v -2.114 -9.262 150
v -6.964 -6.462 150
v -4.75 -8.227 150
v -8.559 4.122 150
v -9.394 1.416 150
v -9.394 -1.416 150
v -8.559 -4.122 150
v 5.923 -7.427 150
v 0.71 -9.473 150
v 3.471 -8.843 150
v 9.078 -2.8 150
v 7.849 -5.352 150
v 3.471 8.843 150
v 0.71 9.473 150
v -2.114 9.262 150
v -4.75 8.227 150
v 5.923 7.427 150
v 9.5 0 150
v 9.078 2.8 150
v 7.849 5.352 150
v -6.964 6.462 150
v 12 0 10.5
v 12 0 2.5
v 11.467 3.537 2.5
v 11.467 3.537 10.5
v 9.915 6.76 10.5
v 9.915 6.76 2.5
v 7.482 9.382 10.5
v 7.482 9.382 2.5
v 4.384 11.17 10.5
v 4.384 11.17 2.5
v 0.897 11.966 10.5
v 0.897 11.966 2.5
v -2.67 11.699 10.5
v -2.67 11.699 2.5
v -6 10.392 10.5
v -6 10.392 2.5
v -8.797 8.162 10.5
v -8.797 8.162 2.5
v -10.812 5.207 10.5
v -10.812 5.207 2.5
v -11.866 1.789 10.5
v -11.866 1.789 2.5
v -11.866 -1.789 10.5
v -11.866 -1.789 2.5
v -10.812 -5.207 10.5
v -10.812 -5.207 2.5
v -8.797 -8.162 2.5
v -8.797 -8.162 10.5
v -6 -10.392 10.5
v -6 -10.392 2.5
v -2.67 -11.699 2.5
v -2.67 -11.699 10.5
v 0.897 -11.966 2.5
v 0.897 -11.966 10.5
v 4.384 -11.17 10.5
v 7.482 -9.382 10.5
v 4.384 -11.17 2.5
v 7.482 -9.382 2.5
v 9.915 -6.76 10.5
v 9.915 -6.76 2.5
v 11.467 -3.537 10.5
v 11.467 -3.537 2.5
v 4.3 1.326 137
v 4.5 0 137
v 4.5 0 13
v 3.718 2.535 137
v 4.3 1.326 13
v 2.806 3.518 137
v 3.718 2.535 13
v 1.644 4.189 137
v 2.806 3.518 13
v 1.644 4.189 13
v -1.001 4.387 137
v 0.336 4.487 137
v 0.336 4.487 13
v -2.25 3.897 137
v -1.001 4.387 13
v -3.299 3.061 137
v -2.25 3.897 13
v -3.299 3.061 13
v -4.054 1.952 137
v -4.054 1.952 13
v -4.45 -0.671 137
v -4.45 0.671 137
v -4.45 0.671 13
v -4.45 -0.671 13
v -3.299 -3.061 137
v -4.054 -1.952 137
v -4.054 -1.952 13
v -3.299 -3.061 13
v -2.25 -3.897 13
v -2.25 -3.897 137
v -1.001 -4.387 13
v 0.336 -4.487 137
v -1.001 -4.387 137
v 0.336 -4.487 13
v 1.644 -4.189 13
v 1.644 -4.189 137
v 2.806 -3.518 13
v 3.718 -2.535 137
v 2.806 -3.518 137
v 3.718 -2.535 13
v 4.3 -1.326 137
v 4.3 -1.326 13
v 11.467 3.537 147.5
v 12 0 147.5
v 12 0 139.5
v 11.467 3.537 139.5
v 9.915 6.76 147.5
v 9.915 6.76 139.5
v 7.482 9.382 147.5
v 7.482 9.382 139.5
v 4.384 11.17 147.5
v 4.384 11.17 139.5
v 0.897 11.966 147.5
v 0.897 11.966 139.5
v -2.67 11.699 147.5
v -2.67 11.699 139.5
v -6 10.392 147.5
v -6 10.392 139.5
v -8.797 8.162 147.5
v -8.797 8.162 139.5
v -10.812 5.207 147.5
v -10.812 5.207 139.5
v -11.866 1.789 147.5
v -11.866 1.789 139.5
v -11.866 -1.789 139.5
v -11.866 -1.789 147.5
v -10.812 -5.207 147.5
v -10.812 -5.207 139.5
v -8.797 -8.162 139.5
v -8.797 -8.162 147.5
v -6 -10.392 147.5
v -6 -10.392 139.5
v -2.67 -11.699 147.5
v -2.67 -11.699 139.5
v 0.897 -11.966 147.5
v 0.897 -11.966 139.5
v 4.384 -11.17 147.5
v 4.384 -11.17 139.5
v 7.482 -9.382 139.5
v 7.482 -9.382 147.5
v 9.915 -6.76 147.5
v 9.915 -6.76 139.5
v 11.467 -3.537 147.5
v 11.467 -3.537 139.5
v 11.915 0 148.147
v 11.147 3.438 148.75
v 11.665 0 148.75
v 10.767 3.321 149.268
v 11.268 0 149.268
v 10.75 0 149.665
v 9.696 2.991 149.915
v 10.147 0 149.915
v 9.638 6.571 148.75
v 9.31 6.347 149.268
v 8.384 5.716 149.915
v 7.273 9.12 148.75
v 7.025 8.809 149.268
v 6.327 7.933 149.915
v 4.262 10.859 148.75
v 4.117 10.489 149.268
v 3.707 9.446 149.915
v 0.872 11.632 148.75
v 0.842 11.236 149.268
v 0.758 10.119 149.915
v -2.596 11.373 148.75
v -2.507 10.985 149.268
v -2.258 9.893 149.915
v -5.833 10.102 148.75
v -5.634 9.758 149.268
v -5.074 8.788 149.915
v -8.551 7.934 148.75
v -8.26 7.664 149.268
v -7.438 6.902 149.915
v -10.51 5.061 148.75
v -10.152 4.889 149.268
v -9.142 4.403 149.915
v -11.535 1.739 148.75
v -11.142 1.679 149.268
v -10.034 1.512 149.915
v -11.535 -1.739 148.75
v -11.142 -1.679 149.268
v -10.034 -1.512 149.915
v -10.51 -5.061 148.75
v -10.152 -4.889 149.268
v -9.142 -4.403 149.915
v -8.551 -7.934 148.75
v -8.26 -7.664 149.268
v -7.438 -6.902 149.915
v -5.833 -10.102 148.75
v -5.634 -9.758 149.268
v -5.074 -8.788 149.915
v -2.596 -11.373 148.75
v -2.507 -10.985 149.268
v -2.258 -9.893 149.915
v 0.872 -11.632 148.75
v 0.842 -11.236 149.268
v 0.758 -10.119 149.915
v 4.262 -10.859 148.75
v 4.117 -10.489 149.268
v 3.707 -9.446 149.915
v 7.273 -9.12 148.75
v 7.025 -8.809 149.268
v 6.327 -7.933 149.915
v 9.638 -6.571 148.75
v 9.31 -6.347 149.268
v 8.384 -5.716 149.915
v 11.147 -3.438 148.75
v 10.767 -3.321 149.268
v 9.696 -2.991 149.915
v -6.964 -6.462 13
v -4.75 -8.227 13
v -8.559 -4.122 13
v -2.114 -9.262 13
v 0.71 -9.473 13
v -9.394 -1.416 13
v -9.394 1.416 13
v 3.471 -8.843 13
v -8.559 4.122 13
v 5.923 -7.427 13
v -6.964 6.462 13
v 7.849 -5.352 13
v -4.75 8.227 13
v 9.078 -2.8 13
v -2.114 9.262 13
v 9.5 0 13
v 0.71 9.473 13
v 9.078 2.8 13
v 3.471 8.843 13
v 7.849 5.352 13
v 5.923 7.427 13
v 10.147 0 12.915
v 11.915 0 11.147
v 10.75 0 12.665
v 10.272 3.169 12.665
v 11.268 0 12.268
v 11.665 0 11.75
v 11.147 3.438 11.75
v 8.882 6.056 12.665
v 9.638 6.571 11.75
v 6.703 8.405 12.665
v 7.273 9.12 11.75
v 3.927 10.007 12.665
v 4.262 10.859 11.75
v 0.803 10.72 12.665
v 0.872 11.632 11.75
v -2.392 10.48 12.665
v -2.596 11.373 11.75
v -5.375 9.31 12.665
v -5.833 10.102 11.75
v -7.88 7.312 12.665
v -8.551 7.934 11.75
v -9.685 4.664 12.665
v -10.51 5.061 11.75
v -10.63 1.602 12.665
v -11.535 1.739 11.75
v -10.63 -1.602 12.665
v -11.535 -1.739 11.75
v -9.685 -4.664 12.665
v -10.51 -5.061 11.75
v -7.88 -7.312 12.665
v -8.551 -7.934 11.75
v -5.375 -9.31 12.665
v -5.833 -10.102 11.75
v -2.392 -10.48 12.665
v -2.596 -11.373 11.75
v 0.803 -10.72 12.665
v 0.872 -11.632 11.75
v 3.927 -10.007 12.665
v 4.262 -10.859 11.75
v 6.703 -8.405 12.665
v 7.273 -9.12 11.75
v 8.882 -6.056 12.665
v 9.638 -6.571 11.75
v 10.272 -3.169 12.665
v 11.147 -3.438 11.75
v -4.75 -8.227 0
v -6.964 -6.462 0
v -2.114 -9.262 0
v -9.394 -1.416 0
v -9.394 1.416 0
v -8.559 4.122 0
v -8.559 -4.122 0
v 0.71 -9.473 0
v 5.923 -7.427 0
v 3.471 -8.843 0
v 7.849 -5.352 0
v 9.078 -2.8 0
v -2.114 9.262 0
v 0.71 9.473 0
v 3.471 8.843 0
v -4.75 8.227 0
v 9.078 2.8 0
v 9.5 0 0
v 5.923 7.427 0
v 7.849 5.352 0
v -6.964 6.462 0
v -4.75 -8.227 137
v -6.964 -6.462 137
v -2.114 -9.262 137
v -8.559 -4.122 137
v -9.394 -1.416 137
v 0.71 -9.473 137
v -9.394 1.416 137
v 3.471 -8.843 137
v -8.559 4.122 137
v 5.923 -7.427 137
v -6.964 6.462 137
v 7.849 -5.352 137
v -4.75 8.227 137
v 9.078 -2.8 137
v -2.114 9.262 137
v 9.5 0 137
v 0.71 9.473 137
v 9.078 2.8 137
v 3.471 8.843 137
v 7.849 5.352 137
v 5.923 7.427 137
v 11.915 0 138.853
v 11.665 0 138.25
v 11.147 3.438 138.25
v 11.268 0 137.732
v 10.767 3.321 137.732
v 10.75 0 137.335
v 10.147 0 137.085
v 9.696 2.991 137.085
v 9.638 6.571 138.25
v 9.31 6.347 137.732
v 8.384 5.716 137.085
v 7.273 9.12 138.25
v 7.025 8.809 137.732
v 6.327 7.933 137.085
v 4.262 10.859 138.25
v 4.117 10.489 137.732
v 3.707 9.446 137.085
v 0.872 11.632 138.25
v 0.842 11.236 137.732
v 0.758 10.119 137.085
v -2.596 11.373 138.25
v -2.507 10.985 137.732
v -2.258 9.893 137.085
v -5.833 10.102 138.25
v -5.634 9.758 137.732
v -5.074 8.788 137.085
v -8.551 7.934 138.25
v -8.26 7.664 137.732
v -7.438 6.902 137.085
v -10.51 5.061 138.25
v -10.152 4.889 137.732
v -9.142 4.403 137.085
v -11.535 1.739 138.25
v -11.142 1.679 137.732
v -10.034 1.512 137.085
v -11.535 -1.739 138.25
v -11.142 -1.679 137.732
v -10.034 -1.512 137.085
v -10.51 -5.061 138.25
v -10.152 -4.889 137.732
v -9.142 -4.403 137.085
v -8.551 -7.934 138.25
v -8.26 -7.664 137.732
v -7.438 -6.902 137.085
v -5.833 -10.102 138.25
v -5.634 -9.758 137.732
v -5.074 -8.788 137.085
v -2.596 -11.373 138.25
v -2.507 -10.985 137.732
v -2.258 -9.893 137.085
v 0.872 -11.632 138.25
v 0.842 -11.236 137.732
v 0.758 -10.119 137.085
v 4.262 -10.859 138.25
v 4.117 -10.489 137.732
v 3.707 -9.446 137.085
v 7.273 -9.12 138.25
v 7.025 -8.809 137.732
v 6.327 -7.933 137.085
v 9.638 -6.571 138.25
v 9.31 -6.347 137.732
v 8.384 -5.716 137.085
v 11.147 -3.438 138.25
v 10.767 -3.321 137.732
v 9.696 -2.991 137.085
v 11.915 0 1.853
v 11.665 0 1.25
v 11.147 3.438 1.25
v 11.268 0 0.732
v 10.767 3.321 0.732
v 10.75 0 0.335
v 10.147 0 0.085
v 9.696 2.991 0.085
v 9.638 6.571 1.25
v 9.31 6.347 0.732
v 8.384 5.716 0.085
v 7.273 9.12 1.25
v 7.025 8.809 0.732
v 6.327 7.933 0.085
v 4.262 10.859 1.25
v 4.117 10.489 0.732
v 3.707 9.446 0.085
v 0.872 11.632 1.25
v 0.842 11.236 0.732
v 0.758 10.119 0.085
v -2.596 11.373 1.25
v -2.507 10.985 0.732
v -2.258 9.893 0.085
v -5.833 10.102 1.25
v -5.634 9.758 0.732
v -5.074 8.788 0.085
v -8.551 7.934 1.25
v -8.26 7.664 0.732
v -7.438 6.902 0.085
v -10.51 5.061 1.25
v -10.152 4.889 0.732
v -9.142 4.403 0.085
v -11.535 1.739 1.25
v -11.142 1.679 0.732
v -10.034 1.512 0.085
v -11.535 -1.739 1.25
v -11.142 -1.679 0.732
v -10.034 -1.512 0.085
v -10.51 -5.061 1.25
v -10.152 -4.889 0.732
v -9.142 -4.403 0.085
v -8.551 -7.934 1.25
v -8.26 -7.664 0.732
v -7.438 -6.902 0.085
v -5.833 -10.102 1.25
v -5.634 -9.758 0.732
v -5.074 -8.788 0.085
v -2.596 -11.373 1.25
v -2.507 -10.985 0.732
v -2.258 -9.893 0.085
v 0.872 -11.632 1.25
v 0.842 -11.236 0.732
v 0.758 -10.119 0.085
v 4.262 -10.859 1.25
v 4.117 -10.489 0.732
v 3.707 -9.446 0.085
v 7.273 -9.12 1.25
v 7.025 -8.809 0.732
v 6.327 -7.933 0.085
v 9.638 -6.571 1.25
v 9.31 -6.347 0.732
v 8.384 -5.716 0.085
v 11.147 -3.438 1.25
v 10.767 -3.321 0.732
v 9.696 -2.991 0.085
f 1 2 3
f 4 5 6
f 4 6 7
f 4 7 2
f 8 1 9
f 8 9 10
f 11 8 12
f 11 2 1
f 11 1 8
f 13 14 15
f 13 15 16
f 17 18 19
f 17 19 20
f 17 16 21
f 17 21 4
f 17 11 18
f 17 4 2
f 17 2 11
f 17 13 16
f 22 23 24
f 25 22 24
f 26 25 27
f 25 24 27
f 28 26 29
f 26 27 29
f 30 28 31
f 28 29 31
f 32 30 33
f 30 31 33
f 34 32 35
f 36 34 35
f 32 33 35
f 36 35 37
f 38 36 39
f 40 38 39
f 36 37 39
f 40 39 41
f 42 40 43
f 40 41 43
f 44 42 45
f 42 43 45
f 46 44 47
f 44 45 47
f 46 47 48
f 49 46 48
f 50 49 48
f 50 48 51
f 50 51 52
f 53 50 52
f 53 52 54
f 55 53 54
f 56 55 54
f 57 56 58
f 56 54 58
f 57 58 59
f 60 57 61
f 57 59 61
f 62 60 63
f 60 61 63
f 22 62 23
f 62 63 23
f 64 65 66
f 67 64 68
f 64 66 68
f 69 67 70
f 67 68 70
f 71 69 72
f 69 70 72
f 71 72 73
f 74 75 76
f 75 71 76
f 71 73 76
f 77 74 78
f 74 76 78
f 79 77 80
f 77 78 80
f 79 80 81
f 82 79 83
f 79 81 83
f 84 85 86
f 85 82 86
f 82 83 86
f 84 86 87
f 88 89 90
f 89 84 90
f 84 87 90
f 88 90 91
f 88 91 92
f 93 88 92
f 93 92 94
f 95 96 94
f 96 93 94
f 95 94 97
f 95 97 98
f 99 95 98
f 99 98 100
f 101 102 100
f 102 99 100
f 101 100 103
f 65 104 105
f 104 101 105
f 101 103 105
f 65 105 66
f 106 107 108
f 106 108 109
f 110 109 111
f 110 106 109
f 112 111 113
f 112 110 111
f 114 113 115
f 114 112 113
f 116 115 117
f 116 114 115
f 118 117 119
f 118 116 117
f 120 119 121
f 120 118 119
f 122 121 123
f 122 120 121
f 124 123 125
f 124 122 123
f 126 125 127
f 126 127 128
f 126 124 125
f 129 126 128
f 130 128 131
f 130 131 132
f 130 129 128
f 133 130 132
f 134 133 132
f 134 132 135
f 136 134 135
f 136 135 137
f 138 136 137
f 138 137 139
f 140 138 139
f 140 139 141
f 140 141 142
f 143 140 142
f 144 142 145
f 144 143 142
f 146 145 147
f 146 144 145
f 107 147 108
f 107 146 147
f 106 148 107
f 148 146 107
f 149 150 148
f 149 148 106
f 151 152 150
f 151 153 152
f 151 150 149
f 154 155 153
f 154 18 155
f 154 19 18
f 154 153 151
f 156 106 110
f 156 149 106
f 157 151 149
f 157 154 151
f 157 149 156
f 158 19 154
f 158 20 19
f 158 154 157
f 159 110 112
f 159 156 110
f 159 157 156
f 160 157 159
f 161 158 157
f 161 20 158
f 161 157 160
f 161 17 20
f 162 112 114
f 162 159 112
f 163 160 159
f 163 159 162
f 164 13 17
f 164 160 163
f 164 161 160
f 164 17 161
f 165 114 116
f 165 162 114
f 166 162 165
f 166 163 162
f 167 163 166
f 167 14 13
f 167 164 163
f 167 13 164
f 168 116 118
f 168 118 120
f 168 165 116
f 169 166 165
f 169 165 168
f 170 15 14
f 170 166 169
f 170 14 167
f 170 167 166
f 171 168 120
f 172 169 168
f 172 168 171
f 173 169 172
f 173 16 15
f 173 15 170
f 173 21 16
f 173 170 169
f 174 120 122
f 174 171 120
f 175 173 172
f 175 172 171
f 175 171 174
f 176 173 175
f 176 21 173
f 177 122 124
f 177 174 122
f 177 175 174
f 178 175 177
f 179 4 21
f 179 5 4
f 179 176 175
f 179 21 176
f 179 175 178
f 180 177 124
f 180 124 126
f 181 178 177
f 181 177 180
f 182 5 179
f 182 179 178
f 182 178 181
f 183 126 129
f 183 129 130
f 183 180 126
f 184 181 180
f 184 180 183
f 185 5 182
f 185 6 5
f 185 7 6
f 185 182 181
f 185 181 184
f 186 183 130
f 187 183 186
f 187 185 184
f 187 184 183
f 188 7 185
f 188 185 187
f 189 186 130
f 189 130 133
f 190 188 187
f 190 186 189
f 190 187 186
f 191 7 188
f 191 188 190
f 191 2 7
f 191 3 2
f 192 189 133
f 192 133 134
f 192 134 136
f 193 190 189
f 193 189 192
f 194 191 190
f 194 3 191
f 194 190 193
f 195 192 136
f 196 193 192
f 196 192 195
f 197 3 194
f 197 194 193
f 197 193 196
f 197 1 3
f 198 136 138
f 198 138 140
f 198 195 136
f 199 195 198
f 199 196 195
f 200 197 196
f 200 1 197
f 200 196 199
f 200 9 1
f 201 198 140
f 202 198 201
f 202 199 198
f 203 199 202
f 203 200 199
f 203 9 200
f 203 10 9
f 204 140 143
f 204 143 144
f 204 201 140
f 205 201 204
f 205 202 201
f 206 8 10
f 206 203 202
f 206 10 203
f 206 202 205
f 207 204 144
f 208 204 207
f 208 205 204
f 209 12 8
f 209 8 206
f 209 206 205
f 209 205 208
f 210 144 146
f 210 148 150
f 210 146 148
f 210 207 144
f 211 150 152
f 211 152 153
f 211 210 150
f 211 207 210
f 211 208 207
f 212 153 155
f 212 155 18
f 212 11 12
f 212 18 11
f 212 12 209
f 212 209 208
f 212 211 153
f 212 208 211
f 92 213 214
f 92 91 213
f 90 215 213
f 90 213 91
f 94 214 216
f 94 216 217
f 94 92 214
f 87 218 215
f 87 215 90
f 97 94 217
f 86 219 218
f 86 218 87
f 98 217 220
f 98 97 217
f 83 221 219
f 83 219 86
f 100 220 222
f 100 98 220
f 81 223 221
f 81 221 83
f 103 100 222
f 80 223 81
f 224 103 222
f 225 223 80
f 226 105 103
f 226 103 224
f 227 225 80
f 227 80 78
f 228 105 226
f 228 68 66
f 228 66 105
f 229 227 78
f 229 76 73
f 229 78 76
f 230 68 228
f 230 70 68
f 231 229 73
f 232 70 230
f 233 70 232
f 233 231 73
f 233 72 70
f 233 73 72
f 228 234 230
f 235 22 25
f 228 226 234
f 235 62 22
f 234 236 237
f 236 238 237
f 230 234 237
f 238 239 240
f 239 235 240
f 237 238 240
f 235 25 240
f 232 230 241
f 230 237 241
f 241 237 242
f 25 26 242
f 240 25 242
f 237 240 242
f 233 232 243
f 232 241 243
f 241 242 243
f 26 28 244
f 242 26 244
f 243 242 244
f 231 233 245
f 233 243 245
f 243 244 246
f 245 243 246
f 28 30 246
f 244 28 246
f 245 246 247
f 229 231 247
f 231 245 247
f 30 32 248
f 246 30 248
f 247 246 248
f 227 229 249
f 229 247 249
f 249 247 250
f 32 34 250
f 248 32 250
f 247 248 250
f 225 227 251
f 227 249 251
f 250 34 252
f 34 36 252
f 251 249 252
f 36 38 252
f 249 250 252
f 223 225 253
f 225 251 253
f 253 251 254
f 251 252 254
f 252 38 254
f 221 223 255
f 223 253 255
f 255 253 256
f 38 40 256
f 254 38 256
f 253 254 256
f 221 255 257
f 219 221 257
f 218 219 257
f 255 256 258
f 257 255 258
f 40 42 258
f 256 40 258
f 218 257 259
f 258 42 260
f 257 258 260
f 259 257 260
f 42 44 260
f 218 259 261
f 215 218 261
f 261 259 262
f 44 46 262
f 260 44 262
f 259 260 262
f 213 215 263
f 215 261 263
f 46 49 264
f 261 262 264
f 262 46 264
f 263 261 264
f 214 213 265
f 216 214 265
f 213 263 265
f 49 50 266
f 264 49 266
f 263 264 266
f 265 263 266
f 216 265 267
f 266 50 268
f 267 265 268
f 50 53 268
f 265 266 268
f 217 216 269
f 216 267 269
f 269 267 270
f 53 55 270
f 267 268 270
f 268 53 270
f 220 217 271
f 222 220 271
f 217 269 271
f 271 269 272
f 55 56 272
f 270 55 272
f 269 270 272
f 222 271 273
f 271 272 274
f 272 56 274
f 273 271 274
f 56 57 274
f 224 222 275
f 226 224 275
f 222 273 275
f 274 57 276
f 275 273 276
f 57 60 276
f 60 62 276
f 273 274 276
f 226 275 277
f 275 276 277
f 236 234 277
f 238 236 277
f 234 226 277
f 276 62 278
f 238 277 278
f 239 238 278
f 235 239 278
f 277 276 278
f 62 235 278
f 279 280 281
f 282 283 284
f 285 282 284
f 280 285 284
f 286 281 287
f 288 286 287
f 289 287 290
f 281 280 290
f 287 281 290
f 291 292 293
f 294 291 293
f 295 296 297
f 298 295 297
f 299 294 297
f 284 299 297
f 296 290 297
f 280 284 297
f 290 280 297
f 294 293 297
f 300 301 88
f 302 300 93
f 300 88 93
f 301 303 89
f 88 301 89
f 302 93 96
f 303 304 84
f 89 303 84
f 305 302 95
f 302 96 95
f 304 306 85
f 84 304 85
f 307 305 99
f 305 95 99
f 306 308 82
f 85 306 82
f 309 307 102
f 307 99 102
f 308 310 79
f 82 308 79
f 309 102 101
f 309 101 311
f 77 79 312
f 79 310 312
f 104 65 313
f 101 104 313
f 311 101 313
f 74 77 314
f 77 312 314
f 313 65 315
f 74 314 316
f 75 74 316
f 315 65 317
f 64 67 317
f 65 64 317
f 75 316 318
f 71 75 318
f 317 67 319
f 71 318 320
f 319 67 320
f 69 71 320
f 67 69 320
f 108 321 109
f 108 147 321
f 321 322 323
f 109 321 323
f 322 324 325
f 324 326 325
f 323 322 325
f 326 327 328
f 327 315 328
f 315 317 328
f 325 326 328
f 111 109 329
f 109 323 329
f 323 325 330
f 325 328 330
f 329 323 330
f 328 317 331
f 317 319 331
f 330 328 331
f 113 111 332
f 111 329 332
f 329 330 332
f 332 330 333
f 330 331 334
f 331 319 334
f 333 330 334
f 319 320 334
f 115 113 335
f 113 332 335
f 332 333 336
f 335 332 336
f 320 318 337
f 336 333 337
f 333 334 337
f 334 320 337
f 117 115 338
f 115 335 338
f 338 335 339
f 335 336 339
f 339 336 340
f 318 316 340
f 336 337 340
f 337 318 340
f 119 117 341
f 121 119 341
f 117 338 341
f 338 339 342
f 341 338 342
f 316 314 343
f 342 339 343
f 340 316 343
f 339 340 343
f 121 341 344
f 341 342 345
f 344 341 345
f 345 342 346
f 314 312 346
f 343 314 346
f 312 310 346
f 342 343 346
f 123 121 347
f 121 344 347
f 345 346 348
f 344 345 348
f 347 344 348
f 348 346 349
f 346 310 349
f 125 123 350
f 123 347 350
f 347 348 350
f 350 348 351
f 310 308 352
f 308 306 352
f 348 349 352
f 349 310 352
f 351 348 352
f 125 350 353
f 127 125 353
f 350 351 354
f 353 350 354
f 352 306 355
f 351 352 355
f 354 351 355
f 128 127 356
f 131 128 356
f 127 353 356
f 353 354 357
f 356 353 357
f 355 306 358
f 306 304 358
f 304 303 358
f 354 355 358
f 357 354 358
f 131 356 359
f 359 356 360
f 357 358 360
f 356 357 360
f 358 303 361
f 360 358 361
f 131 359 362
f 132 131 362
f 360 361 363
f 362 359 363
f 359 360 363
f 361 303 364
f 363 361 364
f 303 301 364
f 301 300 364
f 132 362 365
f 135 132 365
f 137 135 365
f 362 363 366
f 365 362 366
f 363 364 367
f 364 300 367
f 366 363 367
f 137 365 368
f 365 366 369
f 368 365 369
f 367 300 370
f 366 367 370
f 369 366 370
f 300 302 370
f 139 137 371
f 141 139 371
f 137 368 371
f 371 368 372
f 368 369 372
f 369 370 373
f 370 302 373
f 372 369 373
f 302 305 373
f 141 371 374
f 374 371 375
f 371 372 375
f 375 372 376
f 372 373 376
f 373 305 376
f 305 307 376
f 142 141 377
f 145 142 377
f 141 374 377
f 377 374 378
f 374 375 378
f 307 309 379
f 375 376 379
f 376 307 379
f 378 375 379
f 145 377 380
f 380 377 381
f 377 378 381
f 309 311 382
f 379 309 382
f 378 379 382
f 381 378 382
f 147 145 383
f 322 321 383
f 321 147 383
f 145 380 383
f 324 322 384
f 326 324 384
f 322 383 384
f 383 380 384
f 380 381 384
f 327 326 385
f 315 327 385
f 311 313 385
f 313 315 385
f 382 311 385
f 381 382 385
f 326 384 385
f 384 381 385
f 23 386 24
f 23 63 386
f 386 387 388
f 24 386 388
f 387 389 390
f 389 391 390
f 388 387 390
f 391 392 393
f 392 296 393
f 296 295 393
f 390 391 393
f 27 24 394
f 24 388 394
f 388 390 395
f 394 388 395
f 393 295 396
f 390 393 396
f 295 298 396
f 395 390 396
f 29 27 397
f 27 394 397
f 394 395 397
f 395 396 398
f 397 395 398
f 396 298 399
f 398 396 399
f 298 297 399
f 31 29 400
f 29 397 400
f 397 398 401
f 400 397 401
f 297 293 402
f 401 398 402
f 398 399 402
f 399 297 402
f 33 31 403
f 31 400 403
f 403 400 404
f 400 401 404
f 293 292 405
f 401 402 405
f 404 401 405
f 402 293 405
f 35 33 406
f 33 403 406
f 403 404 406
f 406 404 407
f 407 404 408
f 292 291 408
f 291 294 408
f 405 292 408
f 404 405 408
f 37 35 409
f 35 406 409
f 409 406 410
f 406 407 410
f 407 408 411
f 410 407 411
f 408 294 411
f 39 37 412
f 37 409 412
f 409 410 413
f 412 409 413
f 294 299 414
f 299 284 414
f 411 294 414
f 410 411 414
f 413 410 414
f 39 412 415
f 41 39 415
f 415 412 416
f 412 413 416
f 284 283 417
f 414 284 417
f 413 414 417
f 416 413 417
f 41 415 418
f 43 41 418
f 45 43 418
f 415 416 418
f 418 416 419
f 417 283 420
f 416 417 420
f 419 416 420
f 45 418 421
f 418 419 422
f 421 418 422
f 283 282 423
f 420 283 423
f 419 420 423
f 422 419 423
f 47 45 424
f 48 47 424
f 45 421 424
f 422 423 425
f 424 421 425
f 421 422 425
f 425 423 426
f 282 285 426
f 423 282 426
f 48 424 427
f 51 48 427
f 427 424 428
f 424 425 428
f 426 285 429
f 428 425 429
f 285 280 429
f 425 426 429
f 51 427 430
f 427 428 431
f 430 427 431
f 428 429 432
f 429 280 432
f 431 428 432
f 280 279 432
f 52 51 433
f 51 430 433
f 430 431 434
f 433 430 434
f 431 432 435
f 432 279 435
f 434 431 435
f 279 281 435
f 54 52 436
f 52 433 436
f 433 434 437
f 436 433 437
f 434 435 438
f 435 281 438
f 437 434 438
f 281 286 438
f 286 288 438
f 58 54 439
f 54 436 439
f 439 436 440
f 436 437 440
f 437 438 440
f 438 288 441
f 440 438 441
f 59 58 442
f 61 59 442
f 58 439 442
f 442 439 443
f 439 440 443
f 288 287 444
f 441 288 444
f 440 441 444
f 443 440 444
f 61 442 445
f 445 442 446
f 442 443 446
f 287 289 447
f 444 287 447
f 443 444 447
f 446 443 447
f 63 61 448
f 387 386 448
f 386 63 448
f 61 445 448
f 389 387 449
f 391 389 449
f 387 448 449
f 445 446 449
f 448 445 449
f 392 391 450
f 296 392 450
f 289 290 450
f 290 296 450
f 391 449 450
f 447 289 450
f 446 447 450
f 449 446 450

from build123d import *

# Parameters (mm, degrees)
F0_R     = 4.5
F1_DEPTH = 150
F0_R_2   = 12
F2_DEPTH = 13
F3_R     = 12
F4_DEPTH = 13
F5_R     = 2.5


with BuildPart() as f1:
    # F0 (on Top) → F1 (new body)
    with BuildSketch(Plane.XY):
        Circle(F0_R)
    extrude(amount=F1_DEPTH)

    # F0 (on Top) → F2 (join)
    with BuildSketch(Plane.XY):
        Circle(F0_R_2)
        Circle(F0_R, mode=Mode.SUBTRACT)
    extrude(amount=F2_DEPTH)

    # F3 (on face) → F4 (join)
    with BuildSketch(Plane.XY.offset(150)):
        Circle(F3_R)
    extrude(amount=-F4_DEPTH)

    # F5
    f5_edges = [f1.edges().sort_by_distance(p)[0] for p in [
        (-12, 0, 150),
        (-12, 0, 137),
        (-12, 0, 13),
        (-12, 0, 0),
    ]]
    fillet(f5_edges, radius=F5_R)


solid = f1.part
